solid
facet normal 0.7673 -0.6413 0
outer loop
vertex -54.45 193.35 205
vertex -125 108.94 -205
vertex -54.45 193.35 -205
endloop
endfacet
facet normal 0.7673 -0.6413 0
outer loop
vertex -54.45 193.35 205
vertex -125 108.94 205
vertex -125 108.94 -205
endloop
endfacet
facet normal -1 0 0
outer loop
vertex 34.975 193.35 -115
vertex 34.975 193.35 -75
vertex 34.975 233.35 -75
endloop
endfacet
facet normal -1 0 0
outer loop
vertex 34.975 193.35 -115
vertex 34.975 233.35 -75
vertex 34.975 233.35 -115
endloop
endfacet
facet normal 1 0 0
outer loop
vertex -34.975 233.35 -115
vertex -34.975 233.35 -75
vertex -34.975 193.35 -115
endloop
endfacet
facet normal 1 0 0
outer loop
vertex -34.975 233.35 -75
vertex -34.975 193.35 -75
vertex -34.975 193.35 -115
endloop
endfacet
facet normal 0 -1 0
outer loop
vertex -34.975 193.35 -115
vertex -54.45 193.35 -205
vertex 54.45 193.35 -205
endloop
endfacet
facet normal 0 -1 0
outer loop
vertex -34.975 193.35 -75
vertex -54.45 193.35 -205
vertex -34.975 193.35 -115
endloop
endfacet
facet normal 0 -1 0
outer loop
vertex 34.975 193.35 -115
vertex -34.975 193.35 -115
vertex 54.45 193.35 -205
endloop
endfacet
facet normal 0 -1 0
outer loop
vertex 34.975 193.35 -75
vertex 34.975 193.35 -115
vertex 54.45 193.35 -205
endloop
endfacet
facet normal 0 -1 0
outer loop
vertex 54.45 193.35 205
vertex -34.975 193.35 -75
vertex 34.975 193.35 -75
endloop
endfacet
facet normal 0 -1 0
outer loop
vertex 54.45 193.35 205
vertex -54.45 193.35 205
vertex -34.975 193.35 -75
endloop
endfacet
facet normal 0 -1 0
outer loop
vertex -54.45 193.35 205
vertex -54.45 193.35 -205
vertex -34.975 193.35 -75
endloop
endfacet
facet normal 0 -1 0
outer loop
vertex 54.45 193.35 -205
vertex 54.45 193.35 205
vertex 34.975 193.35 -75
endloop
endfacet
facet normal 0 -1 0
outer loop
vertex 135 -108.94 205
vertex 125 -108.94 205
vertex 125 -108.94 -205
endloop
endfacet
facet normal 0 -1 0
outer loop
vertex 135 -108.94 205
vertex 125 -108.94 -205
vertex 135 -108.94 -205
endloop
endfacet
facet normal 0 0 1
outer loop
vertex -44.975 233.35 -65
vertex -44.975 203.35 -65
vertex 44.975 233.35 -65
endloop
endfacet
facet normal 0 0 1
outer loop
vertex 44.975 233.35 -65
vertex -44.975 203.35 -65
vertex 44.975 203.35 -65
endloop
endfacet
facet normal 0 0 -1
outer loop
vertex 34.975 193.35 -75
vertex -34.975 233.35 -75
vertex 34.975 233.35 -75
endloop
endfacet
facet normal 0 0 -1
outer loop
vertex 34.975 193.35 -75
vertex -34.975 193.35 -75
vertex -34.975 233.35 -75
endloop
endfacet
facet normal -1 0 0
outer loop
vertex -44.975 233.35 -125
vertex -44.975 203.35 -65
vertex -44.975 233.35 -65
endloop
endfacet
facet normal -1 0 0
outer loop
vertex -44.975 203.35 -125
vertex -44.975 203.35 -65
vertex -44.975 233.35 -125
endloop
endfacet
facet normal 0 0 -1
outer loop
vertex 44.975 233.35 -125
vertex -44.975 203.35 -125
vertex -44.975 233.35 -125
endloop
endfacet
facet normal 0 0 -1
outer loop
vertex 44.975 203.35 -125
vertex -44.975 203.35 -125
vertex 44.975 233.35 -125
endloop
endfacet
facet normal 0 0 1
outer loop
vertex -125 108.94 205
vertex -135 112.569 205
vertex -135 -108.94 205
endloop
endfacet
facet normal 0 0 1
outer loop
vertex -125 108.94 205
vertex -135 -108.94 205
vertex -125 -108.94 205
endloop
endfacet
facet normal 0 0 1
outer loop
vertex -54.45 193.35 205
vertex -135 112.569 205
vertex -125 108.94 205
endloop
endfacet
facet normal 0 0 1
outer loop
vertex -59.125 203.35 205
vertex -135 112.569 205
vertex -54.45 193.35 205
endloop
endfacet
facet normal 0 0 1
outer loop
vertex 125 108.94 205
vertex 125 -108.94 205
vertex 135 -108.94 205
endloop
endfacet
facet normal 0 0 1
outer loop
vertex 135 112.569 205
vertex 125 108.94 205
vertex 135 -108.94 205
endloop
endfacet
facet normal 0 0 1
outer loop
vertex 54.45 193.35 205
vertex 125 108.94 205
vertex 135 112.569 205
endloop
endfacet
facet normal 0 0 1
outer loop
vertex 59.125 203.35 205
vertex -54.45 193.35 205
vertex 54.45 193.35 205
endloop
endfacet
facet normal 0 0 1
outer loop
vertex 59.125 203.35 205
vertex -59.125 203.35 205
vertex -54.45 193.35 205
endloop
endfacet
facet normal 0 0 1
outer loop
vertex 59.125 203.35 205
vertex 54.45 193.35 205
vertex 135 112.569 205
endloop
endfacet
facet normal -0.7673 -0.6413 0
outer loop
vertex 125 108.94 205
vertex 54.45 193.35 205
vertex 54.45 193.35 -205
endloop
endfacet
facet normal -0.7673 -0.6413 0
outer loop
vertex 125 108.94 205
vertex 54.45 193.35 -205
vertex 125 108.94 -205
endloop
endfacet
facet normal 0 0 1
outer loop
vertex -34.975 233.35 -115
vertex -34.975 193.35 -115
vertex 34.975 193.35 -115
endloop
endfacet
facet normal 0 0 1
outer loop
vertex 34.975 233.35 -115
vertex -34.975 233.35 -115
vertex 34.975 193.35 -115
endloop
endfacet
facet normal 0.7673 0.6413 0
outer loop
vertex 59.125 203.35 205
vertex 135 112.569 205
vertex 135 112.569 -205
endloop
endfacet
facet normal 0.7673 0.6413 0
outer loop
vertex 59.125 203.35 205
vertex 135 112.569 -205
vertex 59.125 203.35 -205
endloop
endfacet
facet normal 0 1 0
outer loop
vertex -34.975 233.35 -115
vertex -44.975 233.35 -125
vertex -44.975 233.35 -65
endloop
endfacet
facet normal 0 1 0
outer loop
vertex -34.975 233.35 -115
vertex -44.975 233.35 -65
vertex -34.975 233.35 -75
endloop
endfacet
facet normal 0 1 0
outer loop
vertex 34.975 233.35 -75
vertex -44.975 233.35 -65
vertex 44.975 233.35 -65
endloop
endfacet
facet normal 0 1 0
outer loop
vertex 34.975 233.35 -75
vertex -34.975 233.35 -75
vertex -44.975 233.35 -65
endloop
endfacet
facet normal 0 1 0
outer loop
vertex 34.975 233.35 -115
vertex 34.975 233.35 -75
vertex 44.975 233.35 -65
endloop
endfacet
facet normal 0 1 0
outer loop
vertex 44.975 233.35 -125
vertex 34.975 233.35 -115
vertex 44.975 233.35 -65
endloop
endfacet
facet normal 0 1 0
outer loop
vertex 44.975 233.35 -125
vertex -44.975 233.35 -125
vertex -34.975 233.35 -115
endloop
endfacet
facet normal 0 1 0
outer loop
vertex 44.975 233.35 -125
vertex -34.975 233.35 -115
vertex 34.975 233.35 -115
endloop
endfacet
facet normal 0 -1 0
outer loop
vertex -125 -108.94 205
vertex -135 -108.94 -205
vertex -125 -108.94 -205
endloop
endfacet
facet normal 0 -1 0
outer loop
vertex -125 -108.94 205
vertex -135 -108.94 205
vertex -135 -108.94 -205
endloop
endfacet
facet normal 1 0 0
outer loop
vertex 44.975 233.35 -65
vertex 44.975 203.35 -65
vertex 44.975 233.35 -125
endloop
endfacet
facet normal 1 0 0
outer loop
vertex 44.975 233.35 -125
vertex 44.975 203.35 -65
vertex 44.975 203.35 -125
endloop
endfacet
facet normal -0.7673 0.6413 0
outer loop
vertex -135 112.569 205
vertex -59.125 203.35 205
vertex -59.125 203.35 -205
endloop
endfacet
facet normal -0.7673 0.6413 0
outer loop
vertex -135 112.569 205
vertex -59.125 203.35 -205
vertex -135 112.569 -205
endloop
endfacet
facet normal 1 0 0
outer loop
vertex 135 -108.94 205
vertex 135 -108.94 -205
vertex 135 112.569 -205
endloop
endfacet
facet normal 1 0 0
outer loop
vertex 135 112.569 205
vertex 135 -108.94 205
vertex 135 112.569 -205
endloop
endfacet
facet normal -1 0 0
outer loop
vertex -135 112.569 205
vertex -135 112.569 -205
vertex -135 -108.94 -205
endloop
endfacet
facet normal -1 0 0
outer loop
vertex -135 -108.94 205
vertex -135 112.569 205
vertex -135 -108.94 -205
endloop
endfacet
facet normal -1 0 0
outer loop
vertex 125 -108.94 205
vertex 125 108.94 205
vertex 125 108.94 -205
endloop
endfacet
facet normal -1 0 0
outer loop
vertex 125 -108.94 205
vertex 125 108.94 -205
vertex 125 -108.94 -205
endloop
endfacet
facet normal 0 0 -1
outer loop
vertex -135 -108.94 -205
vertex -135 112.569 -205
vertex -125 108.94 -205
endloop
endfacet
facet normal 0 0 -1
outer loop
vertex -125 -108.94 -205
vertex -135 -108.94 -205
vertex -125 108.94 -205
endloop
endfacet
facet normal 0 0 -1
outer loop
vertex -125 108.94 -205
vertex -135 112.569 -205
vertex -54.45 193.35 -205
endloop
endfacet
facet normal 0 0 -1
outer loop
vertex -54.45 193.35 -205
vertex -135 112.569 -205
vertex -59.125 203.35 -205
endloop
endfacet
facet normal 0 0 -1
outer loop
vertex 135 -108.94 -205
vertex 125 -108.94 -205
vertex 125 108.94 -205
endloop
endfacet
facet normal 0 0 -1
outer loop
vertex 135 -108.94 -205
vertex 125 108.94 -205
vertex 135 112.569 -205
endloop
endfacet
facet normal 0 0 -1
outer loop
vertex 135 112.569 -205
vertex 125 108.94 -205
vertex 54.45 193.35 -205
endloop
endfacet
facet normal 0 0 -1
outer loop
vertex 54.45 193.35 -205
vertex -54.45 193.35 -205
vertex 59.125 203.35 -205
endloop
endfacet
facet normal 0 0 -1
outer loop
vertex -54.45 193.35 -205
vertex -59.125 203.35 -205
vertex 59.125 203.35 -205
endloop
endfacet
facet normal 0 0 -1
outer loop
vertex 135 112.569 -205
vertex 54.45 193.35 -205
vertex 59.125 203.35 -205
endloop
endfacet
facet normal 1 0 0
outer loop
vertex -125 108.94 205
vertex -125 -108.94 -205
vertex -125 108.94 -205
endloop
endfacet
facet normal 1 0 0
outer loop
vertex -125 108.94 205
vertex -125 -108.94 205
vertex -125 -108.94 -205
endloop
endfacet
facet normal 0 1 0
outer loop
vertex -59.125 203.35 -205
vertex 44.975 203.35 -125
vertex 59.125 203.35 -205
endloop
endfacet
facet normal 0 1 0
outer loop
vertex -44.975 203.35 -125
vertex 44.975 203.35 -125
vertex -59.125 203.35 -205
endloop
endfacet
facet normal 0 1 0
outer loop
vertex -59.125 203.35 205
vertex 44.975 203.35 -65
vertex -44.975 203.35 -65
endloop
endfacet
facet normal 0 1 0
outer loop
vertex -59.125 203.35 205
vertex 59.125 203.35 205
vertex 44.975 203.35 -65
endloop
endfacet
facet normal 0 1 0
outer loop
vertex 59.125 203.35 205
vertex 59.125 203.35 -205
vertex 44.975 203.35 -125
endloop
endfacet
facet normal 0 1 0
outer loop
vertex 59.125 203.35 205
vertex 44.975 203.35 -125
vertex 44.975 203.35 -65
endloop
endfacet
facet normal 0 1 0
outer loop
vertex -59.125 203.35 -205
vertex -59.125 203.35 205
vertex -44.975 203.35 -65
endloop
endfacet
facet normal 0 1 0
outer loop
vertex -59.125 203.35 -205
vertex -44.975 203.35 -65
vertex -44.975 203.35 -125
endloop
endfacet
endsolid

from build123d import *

# Parameters (mm, degrees)
BOSS_EXTRUDE1_DEPTH = 205
SKETCH2_W           = 69.949988916
SKETCH2_H           = 40
CUT_EXTRUDE1_DEPTH  = 204.35
BOSS_EXTRUDE2_START = 203.35
SKETCH3_W           = 89.949988916
SKETCH3_H           = 60
SKETCH3_W_2         = 69.949988916
SKETCH3_H_2         = 40
BOSS_EXTRUDE2_DEPTH = 30


with BuildPart() as part:
    # Sketch1 → Boss-Extrude1 (new body, symmetric)
    with BuildSketch(Plane.XY):
        Polygon((-125, 108.94), (-54.45, 193.35), (54.45, 193.35), (125, 108.94), (125, -108.94), (135, -108.94), (135, 112.568729132), (59.1248826, 203.35), (-59.1248826, 203.35), (-135, 112.568729132), (-135, -108.94), (-125, -108.94), align=None)
    extrude(amount=BOSS_EXTRUDE1_DEPTH, both=True)

    # Sketch2 → Cut-Extrude1 (cut, through all)
    with BuildSketch(Plane(origin=(0, 0, 0), x_dir=(1, 0, 0), z_dir=(0, 1, 0))):
        with Locations((0, 95)):
            Rectangle(SKETCH2_W, SKETCH2_H)
    extrude(amount=CUT_EXTRUDE1_DEPTH, mode=Mode.SUBTRACT)

    # Sketch3 → Boss-Extrude2 (add)
    with BuildSketch(Plane(origin=(0, 0, 0), x_dir=(1, 0, 0), z_dir=(0, 1, 0)).offset(BOSS_EXTRUDE2_START)):
        with Locations((0, 95)):
            Rectangle(SKETCH3_W, SKETCH3_H)
        with Locations((0, 95)):
            Rectangle(SKETCH3_W_2, SKETCH3_H_2, mode=Mode.SUBTRACT)
    extrude(amount=BOSS_EXTRUDE2_DEPTH)


solid = part.part
